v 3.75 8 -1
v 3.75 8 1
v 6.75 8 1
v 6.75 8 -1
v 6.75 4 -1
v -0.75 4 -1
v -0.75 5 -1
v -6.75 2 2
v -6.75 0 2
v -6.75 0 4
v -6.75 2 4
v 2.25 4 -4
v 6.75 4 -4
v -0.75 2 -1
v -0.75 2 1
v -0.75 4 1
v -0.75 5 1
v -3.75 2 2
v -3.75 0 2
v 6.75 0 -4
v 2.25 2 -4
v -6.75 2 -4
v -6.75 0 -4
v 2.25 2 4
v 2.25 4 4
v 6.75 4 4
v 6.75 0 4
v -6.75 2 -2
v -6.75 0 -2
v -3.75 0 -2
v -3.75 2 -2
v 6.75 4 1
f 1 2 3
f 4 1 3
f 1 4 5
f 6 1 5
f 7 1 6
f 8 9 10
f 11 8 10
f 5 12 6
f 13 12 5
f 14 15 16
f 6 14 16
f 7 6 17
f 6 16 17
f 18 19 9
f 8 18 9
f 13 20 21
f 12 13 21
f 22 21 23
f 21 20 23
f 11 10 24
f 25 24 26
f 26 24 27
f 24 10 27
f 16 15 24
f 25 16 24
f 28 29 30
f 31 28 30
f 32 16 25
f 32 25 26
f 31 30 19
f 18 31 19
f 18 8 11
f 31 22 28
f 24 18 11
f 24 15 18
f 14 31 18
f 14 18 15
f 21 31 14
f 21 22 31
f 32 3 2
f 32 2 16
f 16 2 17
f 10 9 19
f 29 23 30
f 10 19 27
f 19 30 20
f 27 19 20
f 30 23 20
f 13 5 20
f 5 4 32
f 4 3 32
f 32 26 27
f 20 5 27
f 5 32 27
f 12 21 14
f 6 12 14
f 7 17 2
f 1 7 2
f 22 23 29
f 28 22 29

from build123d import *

# Parameters (mm, degrees)
BOSS_EXTRUDE1_DEPTH = 2
BOSS_EXTRUDE2_DEPTH = 2
BOSS_EXTRUDE3_DEPTH = 1


with BuildPart() as part:
    # Sketch2 → Boss-Extrude1 (new body)
    with BuildSketch(Plane(origin=(0, 0, 0), x_dir=(1, 0, 0), z_dir=(0, 1, 0))):
        Polygon((-6.75, -2), (-6.75, -4), (6.75, -4), (6.75, 4), (-6.75, 4), (-6.75, 2), (-3.75, 2), (-3.75, -2), align=None)
    extrude(amount=BOSS_EXTRUDE1_DEPTH)

    # Sketch3 → Boss-Extrude2 (add)
    with BuildSketch(Plane(origin=(0, 2, 0), x_dir=(1, 0, 0), z_dir=(0, 1, 0))):
        Polygon((6.75, 4), (2.25, 4), (-0.75, 1), (-0.75, -1), (2.25, -4), (6.75, -4), align=None)
    extrude(amount=BOSS_EXTRUDE2_DEPTH)

    # Sketch5 → Boss-Extrude3 (add, symmetric)
    with BuildSketch(Plane.XY):
        Polygon((3.75, 8), (6.75, 8), (6.75, 4), (-0.75, 4), (-0.75, 5), align=None)
    extrude(amount=BOSS_EXTRUDE3_DEPTH, both=True)


solid = part.part
